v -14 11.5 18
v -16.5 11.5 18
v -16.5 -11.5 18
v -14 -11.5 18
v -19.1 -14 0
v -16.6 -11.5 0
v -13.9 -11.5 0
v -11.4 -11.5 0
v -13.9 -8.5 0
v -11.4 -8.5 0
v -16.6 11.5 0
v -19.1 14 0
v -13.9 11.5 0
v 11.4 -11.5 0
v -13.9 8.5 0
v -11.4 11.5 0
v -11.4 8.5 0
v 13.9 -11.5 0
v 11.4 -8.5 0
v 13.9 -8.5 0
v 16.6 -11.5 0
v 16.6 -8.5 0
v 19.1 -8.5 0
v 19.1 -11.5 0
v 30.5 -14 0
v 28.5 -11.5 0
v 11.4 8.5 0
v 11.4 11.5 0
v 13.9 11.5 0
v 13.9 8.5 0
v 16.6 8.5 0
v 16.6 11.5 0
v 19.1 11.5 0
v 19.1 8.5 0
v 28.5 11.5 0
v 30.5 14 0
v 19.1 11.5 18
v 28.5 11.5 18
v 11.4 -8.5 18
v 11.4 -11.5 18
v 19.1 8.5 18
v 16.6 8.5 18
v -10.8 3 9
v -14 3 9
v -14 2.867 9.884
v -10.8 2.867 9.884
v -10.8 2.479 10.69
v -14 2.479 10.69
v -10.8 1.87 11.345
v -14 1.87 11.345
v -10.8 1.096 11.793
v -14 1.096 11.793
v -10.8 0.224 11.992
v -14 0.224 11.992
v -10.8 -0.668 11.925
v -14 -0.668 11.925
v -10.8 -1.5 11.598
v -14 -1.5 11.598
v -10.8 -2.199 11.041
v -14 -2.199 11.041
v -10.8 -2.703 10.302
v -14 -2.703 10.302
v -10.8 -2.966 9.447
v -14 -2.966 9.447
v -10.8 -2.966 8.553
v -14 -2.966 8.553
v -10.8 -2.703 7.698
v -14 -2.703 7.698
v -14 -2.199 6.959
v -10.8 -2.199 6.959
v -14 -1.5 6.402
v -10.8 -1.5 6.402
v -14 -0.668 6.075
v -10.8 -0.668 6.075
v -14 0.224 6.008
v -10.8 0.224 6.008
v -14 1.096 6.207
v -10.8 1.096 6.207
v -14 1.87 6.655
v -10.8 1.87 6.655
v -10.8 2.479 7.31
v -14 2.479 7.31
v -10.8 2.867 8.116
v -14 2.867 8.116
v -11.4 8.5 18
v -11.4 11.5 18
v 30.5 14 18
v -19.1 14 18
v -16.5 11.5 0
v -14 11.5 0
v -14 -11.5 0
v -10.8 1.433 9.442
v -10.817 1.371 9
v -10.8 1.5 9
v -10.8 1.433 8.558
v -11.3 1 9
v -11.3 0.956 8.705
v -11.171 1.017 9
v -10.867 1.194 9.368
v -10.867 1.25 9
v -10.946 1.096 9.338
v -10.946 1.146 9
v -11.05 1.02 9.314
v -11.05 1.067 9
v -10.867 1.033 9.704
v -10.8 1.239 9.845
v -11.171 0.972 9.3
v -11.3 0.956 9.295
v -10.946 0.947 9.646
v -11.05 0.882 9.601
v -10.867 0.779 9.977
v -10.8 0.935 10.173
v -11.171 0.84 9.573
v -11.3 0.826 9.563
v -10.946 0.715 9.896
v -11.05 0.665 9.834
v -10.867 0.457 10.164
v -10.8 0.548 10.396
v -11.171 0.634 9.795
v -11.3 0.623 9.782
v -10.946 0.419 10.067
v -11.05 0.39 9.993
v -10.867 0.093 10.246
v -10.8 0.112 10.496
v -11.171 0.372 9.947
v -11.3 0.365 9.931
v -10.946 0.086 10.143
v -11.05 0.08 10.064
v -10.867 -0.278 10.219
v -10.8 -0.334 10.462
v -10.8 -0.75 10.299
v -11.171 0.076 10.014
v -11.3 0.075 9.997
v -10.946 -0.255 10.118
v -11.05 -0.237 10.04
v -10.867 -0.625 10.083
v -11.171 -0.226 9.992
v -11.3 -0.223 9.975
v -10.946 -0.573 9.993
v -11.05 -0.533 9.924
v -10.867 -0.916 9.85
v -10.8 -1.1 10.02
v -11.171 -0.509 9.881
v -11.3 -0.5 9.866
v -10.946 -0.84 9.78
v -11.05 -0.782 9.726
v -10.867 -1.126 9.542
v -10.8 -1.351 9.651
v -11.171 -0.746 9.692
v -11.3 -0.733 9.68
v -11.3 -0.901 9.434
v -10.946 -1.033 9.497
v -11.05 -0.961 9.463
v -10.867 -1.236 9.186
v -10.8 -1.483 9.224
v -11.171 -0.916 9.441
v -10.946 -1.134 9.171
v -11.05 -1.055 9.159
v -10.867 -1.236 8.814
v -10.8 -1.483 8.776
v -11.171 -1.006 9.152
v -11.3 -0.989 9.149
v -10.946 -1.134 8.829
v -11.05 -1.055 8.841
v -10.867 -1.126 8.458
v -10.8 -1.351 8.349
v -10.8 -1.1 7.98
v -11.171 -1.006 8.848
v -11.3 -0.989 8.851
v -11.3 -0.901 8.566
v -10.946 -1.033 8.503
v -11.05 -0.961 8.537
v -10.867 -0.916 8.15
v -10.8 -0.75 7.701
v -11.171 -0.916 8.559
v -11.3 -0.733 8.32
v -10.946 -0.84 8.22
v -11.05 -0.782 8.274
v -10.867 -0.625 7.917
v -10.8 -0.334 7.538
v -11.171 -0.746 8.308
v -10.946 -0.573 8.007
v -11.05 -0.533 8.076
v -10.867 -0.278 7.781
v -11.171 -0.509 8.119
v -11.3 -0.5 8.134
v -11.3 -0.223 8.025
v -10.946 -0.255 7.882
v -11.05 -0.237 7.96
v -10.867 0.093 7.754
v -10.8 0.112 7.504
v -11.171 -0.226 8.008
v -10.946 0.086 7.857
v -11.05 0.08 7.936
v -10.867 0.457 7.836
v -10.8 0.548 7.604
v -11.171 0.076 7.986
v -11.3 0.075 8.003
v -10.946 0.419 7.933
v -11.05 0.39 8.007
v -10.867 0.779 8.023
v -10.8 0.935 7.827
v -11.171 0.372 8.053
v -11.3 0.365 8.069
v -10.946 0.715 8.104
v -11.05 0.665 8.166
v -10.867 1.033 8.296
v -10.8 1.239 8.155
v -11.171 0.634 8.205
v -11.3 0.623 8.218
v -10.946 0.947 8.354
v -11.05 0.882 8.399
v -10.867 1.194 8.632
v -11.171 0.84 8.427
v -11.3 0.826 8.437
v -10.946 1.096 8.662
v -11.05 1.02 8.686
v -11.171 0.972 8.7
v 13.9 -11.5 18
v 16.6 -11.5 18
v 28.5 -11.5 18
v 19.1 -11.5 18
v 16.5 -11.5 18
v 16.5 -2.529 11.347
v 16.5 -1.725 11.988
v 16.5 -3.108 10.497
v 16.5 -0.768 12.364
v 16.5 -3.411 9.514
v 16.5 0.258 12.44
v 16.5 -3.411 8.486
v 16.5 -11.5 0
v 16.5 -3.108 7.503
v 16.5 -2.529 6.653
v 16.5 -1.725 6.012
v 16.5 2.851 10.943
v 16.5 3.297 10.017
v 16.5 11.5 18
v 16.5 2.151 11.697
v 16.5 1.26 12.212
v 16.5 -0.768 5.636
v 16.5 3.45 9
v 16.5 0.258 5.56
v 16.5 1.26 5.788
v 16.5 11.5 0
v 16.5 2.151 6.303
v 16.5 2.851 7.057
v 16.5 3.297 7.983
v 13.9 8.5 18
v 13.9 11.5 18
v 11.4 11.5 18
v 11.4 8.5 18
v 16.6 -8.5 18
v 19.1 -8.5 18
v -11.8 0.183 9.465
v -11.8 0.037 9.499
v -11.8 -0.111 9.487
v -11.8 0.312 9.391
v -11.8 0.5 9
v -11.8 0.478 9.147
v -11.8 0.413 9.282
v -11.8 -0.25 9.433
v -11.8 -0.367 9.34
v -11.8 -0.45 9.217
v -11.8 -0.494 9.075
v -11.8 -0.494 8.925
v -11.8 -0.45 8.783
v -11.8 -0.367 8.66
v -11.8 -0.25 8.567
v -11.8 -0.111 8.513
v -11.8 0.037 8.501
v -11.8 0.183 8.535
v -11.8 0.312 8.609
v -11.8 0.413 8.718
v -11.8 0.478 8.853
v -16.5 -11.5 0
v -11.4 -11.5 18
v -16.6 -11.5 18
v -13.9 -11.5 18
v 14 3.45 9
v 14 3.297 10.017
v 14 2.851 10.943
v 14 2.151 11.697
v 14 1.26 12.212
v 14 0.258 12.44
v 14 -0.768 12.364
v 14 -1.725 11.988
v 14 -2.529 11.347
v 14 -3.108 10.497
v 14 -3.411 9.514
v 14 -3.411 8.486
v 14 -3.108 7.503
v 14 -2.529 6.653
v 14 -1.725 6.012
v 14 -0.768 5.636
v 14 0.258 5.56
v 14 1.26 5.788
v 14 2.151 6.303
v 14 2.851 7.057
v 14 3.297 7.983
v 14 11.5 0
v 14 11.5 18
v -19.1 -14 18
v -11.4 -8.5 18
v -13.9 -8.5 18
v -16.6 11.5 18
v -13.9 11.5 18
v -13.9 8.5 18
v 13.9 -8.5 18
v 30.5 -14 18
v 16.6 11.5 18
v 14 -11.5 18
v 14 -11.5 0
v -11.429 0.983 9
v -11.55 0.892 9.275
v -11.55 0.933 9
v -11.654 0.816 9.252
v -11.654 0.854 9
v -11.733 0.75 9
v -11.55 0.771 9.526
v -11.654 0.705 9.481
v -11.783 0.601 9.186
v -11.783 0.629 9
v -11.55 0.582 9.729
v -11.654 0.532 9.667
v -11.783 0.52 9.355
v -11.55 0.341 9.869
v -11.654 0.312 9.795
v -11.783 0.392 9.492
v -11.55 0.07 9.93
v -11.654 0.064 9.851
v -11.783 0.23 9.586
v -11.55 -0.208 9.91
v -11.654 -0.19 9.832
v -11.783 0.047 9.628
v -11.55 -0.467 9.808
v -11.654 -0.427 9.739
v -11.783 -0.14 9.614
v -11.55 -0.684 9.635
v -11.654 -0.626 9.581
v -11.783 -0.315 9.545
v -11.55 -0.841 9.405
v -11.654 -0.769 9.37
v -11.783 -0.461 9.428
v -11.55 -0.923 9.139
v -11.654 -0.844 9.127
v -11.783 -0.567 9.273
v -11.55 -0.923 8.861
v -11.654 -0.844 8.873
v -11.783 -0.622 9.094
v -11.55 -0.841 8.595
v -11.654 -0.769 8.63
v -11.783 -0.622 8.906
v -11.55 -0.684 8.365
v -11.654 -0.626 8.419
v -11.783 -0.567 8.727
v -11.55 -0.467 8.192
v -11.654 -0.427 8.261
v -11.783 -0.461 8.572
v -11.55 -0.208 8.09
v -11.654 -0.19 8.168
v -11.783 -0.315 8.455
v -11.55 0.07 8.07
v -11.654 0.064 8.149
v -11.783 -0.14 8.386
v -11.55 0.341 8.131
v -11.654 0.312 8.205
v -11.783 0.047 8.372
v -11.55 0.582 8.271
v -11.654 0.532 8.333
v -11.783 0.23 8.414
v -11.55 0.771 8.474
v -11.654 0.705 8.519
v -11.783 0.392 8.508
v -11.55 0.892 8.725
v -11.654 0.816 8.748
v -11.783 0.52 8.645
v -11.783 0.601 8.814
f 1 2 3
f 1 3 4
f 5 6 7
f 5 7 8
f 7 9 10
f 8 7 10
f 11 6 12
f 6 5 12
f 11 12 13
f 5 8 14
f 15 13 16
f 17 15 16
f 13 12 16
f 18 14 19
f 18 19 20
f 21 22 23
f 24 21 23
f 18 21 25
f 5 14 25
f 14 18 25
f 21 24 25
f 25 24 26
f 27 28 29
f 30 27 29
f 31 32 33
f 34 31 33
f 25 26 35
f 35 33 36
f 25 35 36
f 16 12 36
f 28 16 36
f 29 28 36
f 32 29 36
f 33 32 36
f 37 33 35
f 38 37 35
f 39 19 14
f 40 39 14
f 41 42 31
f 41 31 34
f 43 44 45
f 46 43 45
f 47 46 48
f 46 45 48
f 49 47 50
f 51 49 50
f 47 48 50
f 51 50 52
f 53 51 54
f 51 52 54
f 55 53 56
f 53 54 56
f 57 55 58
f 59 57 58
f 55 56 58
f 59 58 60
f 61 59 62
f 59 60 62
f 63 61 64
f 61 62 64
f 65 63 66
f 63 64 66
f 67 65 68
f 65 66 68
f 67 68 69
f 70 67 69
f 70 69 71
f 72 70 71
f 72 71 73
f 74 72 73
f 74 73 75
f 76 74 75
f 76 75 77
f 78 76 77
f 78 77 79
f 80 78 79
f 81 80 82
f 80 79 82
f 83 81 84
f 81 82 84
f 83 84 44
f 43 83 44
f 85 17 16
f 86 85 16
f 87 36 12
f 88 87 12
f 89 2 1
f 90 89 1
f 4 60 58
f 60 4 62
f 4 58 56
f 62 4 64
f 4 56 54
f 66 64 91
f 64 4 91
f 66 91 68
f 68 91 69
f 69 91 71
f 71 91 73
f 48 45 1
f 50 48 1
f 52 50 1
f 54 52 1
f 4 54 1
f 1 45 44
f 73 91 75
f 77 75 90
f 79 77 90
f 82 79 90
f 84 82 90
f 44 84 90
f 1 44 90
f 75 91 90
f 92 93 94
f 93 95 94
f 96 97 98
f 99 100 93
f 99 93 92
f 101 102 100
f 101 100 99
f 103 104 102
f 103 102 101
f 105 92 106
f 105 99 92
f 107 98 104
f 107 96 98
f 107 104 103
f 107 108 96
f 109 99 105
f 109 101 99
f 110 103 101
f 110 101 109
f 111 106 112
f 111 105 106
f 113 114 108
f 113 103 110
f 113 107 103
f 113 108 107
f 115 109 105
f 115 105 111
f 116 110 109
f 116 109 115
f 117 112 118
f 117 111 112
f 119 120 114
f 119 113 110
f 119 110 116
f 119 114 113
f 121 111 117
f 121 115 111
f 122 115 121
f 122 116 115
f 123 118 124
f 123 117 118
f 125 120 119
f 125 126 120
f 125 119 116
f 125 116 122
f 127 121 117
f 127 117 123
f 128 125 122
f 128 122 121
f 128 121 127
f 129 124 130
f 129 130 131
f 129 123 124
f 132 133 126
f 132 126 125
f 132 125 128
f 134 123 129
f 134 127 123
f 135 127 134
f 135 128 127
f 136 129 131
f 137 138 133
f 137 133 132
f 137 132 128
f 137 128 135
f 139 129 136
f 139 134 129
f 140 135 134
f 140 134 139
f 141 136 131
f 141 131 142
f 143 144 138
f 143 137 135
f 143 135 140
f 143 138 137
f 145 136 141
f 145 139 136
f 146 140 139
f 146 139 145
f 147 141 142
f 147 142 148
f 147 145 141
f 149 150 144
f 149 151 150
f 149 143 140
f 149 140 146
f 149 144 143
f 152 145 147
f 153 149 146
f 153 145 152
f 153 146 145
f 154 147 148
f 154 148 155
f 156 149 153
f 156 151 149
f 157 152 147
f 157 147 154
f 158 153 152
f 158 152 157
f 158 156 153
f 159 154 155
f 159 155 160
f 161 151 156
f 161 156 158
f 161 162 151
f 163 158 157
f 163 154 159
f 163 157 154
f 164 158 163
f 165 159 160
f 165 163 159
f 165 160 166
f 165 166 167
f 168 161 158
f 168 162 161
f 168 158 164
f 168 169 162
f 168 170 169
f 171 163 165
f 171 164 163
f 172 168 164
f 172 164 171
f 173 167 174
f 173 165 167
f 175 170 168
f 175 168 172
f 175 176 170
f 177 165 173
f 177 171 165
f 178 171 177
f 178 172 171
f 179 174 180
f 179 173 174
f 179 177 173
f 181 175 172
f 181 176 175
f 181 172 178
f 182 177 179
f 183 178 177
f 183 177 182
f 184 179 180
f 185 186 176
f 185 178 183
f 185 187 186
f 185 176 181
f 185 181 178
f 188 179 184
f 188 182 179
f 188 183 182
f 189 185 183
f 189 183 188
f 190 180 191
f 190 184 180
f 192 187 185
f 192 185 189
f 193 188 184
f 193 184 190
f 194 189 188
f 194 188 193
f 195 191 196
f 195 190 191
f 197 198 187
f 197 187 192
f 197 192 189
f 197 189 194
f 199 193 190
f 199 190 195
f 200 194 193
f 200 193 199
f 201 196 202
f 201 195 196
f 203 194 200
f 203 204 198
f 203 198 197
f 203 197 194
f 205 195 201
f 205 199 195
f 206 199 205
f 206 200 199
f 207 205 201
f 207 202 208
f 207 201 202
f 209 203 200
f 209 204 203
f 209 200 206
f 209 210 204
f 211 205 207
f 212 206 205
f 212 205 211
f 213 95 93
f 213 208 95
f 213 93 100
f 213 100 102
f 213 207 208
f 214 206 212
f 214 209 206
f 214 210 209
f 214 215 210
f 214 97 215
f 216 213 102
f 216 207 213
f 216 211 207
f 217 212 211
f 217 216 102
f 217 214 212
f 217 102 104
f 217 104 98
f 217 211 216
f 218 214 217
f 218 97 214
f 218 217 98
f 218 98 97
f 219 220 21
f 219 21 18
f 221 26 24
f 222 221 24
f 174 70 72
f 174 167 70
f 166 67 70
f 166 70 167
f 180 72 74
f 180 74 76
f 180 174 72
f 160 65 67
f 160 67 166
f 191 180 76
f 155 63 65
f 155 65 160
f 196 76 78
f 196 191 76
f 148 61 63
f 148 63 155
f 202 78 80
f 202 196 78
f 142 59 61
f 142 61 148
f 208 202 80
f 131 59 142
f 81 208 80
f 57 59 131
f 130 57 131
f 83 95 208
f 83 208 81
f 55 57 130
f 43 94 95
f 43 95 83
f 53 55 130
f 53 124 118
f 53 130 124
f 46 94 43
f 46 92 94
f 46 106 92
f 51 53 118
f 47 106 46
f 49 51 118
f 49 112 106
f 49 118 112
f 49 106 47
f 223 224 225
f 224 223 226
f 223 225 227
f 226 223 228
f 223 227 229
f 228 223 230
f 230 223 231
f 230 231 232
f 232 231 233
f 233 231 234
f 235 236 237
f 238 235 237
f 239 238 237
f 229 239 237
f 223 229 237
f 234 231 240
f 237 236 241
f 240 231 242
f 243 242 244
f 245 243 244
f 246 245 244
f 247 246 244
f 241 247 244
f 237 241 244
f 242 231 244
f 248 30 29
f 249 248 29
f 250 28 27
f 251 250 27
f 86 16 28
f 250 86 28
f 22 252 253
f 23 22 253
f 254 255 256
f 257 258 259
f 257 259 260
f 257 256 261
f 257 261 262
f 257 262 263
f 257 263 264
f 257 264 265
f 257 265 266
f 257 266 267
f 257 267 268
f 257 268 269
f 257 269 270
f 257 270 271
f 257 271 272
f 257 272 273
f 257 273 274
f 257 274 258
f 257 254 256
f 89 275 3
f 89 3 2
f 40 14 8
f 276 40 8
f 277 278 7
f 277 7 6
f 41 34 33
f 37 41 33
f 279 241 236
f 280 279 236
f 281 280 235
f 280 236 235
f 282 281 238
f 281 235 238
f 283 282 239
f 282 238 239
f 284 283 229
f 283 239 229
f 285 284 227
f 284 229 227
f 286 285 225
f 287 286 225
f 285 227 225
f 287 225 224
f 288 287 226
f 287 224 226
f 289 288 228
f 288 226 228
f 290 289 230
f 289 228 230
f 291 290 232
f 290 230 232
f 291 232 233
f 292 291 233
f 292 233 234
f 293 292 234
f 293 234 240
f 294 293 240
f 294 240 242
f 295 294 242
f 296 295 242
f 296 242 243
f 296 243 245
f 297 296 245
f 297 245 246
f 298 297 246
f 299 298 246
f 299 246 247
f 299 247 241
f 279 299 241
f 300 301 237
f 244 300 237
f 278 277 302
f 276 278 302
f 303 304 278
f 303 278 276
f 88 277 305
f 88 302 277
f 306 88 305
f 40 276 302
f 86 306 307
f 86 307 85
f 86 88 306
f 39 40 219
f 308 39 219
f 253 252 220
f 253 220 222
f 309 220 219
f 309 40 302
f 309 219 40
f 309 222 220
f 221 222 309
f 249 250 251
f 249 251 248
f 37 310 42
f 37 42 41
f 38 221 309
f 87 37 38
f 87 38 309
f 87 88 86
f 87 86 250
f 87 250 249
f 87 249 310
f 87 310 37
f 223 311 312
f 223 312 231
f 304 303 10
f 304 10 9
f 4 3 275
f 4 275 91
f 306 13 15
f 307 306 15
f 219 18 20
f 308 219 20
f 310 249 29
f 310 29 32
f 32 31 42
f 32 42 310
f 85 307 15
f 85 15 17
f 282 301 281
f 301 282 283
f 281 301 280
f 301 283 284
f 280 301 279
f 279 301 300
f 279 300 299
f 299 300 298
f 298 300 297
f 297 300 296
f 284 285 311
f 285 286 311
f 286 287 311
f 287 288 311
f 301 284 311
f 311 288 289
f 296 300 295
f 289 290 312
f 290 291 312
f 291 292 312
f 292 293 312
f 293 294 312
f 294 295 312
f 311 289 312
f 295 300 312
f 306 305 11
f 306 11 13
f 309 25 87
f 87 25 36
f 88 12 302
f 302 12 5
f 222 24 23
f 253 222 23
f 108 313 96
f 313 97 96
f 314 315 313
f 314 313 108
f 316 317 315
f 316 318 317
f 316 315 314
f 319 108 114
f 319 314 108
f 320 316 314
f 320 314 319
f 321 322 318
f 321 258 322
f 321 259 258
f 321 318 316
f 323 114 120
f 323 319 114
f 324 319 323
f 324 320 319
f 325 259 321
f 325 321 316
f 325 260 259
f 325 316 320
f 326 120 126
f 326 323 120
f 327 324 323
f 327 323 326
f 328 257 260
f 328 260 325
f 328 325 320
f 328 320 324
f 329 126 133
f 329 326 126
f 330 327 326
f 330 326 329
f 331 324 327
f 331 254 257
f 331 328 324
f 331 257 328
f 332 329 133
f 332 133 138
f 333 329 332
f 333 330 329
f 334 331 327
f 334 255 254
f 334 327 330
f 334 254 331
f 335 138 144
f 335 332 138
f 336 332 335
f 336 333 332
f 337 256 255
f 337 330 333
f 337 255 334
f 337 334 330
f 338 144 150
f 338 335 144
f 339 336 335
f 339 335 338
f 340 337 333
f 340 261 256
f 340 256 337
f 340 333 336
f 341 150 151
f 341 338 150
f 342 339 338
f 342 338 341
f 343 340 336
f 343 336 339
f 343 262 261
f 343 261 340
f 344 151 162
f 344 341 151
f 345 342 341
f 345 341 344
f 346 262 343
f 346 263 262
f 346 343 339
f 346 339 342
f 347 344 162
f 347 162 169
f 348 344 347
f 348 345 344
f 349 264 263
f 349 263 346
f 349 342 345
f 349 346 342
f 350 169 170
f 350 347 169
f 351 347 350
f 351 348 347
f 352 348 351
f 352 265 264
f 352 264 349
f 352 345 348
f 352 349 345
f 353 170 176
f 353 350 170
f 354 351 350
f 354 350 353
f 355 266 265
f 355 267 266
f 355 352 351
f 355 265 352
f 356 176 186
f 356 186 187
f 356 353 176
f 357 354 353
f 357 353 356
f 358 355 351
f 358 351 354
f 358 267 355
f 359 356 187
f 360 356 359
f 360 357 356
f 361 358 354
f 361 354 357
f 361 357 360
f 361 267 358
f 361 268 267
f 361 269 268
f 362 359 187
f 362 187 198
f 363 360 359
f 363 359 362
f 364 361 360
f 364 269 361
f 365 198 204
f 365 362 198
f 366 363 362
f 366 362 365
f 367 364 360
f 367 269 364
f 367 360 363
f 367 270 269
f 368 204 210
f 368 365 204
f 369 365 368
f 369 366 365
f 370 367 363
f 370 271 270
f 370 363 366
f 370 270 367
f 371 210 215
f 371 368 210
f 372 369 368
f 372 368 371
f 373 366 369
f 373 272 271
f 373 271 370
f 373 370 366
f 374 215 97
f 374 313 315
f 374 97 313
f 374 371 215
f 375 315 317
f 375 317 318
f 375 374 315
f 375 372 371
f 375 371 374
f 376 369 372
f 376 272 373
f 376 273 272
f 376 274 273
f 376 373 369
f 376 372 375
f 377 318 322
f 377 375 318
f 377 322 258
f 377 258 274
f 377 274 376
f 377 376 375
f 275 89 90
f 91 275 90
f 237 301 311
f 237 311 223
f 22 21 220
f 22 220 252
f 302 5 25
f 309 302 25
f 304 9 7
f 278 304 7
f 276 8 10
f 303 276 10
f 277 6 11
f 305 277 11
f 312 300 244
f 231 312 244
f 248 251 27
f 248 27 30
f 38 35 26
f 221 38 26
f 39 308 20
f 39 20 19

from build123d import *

# Parameters (mm, degrees)
F0_W      = 33
F0_H      = 23
F0_W_2    = 28
F0_H_2    = 18
F1_DEPTH  = 18
F2_R      = 3.45
F3_DEPTH  = 5
F4_R      = 3
F5_DEPTH  = 3.2
F6_R      = 1
F7_DEPTH  = 1
F8_R      = 0.49999
F9_W      = 2.5
F9_H      = 3
F10_DEPTH = 18
F11_W     = 28
F11_H     = 2.5
F12_DEPTH = 25


# Not quite as in the source:
# - a fillet or chamfer is up to 0.001 mm smaller than in the source, because OpenCascade refuses the exact size


with BuildPart() as f1:
    # F0 (on Top) → F1 (new body)
    with BuildSketch(Plane.XY):
        Rectangle(F0_W, F0_H)
        Rectangle(F0_W_2, F0_H_2, mode=Mode.SUBTRACT)
    extrude(amount=F1_DEPTH)

    # F2 (on face) → F3 (cut)
    with BuildSketch(Plane.YZ.offset(16.5)):
        with Locations((0, 9)):
            Circle(F2_R)
    extrude(amount=-F3_DEPTH, mode=Mode.SUBTRACT)

    # F4 (on face) → F5 (join)
    with BuildSketch(Plane.YZ.offset(-14)):
        with Locations((0, 9)):
            Circle(F4_R)
    extrude(amount=F5_DEPTH)

    # F6 (on face) → F7 (cut)
    with BuildSketch(Plane.YZ.offset(-10.8)):
        with Locations((0, 9)):
            Circle(F6_R)
    extrude(amount=-F7_DEPTH, mode=Mode.SUBTRACT)

    # F8 (radius 0.5 in the source; OpenCascade refuses exactly that, so slightly less here)
    f8_edges = [f1.edges().sort_by_distance(p)[0] for p in [
        (-11.8, -1, 9),
        (-10.8, -1, 9),
    ]]
    fillet(f8_edges, radius=F8_R)

    # F11 (on face) → F12 (cut)
    with BuildSketch(Plane(origin=(0, 0, 0), x_dir=(1, 0, 0), z_dir=(0, 0, -1))):
        with Locations((0, -10.25)):
            Rectangle(F11_W, F11_H)
        with Locations((0, 10.25)):
            Rectangle(F11_W, F11_H)
        Polygon((-14, -9), (14, -9), (14, 9), (-14, 9), (-14, 4.632844124), (-9.7779119387, 4.632844124), (-9.7779119387, -4.2528109625), (-14, -4.2528109625), align=None)
    extrude(amount=-F12_DEPTH, mode=Mode.SUBTRACT)


with BuildPart() as f10:
    # F9 (on Top) → F10 (new body)
    with BuildSketch(Plane.XY):
        Polygon((-19.1, 0), (-16.6, 0), (-16.6, 11.5), (-13.9, 11.5), (-13.9, 8.5), (-11.4, 8.5), (-11.4, 11.5), (11.4, 11.5), (11.4, 8.5), (13.9, 8.5), (13.9, 11.5), (16.6, 11.5), (19.1, 11.5), (28.5, 11.5), (28.5, 0), (30.5, 0), (30.5, 14), (-19.1, 14), align=None)
        Polygon((-16.6, -11.5), (-16.6, 0), (-19.1, 0), (-19.1, -14), (30.5, -14), (30.5, 0), (28.5, 0), (28.5, -11.5), (19.1, -11.5), (16.6, -11.5), (13.9, -11.5), (13.9, -8.5), (11.4, -8.5), (11.4, -11.5), (-11.4, -11.5), (-11.4, -8.5), (-13.9, -8.5), (-13.9, -11.5), align=None)
        with Locations((17.85, 10)):
            Rectangle(F9_W, F9_H)
        with Locations((17.85, -10)):
            Rectangle(F9_W, F9_H)
    extrude(amount=F10_DEPTH)


solid = Compound([f1.part, f10.part])
